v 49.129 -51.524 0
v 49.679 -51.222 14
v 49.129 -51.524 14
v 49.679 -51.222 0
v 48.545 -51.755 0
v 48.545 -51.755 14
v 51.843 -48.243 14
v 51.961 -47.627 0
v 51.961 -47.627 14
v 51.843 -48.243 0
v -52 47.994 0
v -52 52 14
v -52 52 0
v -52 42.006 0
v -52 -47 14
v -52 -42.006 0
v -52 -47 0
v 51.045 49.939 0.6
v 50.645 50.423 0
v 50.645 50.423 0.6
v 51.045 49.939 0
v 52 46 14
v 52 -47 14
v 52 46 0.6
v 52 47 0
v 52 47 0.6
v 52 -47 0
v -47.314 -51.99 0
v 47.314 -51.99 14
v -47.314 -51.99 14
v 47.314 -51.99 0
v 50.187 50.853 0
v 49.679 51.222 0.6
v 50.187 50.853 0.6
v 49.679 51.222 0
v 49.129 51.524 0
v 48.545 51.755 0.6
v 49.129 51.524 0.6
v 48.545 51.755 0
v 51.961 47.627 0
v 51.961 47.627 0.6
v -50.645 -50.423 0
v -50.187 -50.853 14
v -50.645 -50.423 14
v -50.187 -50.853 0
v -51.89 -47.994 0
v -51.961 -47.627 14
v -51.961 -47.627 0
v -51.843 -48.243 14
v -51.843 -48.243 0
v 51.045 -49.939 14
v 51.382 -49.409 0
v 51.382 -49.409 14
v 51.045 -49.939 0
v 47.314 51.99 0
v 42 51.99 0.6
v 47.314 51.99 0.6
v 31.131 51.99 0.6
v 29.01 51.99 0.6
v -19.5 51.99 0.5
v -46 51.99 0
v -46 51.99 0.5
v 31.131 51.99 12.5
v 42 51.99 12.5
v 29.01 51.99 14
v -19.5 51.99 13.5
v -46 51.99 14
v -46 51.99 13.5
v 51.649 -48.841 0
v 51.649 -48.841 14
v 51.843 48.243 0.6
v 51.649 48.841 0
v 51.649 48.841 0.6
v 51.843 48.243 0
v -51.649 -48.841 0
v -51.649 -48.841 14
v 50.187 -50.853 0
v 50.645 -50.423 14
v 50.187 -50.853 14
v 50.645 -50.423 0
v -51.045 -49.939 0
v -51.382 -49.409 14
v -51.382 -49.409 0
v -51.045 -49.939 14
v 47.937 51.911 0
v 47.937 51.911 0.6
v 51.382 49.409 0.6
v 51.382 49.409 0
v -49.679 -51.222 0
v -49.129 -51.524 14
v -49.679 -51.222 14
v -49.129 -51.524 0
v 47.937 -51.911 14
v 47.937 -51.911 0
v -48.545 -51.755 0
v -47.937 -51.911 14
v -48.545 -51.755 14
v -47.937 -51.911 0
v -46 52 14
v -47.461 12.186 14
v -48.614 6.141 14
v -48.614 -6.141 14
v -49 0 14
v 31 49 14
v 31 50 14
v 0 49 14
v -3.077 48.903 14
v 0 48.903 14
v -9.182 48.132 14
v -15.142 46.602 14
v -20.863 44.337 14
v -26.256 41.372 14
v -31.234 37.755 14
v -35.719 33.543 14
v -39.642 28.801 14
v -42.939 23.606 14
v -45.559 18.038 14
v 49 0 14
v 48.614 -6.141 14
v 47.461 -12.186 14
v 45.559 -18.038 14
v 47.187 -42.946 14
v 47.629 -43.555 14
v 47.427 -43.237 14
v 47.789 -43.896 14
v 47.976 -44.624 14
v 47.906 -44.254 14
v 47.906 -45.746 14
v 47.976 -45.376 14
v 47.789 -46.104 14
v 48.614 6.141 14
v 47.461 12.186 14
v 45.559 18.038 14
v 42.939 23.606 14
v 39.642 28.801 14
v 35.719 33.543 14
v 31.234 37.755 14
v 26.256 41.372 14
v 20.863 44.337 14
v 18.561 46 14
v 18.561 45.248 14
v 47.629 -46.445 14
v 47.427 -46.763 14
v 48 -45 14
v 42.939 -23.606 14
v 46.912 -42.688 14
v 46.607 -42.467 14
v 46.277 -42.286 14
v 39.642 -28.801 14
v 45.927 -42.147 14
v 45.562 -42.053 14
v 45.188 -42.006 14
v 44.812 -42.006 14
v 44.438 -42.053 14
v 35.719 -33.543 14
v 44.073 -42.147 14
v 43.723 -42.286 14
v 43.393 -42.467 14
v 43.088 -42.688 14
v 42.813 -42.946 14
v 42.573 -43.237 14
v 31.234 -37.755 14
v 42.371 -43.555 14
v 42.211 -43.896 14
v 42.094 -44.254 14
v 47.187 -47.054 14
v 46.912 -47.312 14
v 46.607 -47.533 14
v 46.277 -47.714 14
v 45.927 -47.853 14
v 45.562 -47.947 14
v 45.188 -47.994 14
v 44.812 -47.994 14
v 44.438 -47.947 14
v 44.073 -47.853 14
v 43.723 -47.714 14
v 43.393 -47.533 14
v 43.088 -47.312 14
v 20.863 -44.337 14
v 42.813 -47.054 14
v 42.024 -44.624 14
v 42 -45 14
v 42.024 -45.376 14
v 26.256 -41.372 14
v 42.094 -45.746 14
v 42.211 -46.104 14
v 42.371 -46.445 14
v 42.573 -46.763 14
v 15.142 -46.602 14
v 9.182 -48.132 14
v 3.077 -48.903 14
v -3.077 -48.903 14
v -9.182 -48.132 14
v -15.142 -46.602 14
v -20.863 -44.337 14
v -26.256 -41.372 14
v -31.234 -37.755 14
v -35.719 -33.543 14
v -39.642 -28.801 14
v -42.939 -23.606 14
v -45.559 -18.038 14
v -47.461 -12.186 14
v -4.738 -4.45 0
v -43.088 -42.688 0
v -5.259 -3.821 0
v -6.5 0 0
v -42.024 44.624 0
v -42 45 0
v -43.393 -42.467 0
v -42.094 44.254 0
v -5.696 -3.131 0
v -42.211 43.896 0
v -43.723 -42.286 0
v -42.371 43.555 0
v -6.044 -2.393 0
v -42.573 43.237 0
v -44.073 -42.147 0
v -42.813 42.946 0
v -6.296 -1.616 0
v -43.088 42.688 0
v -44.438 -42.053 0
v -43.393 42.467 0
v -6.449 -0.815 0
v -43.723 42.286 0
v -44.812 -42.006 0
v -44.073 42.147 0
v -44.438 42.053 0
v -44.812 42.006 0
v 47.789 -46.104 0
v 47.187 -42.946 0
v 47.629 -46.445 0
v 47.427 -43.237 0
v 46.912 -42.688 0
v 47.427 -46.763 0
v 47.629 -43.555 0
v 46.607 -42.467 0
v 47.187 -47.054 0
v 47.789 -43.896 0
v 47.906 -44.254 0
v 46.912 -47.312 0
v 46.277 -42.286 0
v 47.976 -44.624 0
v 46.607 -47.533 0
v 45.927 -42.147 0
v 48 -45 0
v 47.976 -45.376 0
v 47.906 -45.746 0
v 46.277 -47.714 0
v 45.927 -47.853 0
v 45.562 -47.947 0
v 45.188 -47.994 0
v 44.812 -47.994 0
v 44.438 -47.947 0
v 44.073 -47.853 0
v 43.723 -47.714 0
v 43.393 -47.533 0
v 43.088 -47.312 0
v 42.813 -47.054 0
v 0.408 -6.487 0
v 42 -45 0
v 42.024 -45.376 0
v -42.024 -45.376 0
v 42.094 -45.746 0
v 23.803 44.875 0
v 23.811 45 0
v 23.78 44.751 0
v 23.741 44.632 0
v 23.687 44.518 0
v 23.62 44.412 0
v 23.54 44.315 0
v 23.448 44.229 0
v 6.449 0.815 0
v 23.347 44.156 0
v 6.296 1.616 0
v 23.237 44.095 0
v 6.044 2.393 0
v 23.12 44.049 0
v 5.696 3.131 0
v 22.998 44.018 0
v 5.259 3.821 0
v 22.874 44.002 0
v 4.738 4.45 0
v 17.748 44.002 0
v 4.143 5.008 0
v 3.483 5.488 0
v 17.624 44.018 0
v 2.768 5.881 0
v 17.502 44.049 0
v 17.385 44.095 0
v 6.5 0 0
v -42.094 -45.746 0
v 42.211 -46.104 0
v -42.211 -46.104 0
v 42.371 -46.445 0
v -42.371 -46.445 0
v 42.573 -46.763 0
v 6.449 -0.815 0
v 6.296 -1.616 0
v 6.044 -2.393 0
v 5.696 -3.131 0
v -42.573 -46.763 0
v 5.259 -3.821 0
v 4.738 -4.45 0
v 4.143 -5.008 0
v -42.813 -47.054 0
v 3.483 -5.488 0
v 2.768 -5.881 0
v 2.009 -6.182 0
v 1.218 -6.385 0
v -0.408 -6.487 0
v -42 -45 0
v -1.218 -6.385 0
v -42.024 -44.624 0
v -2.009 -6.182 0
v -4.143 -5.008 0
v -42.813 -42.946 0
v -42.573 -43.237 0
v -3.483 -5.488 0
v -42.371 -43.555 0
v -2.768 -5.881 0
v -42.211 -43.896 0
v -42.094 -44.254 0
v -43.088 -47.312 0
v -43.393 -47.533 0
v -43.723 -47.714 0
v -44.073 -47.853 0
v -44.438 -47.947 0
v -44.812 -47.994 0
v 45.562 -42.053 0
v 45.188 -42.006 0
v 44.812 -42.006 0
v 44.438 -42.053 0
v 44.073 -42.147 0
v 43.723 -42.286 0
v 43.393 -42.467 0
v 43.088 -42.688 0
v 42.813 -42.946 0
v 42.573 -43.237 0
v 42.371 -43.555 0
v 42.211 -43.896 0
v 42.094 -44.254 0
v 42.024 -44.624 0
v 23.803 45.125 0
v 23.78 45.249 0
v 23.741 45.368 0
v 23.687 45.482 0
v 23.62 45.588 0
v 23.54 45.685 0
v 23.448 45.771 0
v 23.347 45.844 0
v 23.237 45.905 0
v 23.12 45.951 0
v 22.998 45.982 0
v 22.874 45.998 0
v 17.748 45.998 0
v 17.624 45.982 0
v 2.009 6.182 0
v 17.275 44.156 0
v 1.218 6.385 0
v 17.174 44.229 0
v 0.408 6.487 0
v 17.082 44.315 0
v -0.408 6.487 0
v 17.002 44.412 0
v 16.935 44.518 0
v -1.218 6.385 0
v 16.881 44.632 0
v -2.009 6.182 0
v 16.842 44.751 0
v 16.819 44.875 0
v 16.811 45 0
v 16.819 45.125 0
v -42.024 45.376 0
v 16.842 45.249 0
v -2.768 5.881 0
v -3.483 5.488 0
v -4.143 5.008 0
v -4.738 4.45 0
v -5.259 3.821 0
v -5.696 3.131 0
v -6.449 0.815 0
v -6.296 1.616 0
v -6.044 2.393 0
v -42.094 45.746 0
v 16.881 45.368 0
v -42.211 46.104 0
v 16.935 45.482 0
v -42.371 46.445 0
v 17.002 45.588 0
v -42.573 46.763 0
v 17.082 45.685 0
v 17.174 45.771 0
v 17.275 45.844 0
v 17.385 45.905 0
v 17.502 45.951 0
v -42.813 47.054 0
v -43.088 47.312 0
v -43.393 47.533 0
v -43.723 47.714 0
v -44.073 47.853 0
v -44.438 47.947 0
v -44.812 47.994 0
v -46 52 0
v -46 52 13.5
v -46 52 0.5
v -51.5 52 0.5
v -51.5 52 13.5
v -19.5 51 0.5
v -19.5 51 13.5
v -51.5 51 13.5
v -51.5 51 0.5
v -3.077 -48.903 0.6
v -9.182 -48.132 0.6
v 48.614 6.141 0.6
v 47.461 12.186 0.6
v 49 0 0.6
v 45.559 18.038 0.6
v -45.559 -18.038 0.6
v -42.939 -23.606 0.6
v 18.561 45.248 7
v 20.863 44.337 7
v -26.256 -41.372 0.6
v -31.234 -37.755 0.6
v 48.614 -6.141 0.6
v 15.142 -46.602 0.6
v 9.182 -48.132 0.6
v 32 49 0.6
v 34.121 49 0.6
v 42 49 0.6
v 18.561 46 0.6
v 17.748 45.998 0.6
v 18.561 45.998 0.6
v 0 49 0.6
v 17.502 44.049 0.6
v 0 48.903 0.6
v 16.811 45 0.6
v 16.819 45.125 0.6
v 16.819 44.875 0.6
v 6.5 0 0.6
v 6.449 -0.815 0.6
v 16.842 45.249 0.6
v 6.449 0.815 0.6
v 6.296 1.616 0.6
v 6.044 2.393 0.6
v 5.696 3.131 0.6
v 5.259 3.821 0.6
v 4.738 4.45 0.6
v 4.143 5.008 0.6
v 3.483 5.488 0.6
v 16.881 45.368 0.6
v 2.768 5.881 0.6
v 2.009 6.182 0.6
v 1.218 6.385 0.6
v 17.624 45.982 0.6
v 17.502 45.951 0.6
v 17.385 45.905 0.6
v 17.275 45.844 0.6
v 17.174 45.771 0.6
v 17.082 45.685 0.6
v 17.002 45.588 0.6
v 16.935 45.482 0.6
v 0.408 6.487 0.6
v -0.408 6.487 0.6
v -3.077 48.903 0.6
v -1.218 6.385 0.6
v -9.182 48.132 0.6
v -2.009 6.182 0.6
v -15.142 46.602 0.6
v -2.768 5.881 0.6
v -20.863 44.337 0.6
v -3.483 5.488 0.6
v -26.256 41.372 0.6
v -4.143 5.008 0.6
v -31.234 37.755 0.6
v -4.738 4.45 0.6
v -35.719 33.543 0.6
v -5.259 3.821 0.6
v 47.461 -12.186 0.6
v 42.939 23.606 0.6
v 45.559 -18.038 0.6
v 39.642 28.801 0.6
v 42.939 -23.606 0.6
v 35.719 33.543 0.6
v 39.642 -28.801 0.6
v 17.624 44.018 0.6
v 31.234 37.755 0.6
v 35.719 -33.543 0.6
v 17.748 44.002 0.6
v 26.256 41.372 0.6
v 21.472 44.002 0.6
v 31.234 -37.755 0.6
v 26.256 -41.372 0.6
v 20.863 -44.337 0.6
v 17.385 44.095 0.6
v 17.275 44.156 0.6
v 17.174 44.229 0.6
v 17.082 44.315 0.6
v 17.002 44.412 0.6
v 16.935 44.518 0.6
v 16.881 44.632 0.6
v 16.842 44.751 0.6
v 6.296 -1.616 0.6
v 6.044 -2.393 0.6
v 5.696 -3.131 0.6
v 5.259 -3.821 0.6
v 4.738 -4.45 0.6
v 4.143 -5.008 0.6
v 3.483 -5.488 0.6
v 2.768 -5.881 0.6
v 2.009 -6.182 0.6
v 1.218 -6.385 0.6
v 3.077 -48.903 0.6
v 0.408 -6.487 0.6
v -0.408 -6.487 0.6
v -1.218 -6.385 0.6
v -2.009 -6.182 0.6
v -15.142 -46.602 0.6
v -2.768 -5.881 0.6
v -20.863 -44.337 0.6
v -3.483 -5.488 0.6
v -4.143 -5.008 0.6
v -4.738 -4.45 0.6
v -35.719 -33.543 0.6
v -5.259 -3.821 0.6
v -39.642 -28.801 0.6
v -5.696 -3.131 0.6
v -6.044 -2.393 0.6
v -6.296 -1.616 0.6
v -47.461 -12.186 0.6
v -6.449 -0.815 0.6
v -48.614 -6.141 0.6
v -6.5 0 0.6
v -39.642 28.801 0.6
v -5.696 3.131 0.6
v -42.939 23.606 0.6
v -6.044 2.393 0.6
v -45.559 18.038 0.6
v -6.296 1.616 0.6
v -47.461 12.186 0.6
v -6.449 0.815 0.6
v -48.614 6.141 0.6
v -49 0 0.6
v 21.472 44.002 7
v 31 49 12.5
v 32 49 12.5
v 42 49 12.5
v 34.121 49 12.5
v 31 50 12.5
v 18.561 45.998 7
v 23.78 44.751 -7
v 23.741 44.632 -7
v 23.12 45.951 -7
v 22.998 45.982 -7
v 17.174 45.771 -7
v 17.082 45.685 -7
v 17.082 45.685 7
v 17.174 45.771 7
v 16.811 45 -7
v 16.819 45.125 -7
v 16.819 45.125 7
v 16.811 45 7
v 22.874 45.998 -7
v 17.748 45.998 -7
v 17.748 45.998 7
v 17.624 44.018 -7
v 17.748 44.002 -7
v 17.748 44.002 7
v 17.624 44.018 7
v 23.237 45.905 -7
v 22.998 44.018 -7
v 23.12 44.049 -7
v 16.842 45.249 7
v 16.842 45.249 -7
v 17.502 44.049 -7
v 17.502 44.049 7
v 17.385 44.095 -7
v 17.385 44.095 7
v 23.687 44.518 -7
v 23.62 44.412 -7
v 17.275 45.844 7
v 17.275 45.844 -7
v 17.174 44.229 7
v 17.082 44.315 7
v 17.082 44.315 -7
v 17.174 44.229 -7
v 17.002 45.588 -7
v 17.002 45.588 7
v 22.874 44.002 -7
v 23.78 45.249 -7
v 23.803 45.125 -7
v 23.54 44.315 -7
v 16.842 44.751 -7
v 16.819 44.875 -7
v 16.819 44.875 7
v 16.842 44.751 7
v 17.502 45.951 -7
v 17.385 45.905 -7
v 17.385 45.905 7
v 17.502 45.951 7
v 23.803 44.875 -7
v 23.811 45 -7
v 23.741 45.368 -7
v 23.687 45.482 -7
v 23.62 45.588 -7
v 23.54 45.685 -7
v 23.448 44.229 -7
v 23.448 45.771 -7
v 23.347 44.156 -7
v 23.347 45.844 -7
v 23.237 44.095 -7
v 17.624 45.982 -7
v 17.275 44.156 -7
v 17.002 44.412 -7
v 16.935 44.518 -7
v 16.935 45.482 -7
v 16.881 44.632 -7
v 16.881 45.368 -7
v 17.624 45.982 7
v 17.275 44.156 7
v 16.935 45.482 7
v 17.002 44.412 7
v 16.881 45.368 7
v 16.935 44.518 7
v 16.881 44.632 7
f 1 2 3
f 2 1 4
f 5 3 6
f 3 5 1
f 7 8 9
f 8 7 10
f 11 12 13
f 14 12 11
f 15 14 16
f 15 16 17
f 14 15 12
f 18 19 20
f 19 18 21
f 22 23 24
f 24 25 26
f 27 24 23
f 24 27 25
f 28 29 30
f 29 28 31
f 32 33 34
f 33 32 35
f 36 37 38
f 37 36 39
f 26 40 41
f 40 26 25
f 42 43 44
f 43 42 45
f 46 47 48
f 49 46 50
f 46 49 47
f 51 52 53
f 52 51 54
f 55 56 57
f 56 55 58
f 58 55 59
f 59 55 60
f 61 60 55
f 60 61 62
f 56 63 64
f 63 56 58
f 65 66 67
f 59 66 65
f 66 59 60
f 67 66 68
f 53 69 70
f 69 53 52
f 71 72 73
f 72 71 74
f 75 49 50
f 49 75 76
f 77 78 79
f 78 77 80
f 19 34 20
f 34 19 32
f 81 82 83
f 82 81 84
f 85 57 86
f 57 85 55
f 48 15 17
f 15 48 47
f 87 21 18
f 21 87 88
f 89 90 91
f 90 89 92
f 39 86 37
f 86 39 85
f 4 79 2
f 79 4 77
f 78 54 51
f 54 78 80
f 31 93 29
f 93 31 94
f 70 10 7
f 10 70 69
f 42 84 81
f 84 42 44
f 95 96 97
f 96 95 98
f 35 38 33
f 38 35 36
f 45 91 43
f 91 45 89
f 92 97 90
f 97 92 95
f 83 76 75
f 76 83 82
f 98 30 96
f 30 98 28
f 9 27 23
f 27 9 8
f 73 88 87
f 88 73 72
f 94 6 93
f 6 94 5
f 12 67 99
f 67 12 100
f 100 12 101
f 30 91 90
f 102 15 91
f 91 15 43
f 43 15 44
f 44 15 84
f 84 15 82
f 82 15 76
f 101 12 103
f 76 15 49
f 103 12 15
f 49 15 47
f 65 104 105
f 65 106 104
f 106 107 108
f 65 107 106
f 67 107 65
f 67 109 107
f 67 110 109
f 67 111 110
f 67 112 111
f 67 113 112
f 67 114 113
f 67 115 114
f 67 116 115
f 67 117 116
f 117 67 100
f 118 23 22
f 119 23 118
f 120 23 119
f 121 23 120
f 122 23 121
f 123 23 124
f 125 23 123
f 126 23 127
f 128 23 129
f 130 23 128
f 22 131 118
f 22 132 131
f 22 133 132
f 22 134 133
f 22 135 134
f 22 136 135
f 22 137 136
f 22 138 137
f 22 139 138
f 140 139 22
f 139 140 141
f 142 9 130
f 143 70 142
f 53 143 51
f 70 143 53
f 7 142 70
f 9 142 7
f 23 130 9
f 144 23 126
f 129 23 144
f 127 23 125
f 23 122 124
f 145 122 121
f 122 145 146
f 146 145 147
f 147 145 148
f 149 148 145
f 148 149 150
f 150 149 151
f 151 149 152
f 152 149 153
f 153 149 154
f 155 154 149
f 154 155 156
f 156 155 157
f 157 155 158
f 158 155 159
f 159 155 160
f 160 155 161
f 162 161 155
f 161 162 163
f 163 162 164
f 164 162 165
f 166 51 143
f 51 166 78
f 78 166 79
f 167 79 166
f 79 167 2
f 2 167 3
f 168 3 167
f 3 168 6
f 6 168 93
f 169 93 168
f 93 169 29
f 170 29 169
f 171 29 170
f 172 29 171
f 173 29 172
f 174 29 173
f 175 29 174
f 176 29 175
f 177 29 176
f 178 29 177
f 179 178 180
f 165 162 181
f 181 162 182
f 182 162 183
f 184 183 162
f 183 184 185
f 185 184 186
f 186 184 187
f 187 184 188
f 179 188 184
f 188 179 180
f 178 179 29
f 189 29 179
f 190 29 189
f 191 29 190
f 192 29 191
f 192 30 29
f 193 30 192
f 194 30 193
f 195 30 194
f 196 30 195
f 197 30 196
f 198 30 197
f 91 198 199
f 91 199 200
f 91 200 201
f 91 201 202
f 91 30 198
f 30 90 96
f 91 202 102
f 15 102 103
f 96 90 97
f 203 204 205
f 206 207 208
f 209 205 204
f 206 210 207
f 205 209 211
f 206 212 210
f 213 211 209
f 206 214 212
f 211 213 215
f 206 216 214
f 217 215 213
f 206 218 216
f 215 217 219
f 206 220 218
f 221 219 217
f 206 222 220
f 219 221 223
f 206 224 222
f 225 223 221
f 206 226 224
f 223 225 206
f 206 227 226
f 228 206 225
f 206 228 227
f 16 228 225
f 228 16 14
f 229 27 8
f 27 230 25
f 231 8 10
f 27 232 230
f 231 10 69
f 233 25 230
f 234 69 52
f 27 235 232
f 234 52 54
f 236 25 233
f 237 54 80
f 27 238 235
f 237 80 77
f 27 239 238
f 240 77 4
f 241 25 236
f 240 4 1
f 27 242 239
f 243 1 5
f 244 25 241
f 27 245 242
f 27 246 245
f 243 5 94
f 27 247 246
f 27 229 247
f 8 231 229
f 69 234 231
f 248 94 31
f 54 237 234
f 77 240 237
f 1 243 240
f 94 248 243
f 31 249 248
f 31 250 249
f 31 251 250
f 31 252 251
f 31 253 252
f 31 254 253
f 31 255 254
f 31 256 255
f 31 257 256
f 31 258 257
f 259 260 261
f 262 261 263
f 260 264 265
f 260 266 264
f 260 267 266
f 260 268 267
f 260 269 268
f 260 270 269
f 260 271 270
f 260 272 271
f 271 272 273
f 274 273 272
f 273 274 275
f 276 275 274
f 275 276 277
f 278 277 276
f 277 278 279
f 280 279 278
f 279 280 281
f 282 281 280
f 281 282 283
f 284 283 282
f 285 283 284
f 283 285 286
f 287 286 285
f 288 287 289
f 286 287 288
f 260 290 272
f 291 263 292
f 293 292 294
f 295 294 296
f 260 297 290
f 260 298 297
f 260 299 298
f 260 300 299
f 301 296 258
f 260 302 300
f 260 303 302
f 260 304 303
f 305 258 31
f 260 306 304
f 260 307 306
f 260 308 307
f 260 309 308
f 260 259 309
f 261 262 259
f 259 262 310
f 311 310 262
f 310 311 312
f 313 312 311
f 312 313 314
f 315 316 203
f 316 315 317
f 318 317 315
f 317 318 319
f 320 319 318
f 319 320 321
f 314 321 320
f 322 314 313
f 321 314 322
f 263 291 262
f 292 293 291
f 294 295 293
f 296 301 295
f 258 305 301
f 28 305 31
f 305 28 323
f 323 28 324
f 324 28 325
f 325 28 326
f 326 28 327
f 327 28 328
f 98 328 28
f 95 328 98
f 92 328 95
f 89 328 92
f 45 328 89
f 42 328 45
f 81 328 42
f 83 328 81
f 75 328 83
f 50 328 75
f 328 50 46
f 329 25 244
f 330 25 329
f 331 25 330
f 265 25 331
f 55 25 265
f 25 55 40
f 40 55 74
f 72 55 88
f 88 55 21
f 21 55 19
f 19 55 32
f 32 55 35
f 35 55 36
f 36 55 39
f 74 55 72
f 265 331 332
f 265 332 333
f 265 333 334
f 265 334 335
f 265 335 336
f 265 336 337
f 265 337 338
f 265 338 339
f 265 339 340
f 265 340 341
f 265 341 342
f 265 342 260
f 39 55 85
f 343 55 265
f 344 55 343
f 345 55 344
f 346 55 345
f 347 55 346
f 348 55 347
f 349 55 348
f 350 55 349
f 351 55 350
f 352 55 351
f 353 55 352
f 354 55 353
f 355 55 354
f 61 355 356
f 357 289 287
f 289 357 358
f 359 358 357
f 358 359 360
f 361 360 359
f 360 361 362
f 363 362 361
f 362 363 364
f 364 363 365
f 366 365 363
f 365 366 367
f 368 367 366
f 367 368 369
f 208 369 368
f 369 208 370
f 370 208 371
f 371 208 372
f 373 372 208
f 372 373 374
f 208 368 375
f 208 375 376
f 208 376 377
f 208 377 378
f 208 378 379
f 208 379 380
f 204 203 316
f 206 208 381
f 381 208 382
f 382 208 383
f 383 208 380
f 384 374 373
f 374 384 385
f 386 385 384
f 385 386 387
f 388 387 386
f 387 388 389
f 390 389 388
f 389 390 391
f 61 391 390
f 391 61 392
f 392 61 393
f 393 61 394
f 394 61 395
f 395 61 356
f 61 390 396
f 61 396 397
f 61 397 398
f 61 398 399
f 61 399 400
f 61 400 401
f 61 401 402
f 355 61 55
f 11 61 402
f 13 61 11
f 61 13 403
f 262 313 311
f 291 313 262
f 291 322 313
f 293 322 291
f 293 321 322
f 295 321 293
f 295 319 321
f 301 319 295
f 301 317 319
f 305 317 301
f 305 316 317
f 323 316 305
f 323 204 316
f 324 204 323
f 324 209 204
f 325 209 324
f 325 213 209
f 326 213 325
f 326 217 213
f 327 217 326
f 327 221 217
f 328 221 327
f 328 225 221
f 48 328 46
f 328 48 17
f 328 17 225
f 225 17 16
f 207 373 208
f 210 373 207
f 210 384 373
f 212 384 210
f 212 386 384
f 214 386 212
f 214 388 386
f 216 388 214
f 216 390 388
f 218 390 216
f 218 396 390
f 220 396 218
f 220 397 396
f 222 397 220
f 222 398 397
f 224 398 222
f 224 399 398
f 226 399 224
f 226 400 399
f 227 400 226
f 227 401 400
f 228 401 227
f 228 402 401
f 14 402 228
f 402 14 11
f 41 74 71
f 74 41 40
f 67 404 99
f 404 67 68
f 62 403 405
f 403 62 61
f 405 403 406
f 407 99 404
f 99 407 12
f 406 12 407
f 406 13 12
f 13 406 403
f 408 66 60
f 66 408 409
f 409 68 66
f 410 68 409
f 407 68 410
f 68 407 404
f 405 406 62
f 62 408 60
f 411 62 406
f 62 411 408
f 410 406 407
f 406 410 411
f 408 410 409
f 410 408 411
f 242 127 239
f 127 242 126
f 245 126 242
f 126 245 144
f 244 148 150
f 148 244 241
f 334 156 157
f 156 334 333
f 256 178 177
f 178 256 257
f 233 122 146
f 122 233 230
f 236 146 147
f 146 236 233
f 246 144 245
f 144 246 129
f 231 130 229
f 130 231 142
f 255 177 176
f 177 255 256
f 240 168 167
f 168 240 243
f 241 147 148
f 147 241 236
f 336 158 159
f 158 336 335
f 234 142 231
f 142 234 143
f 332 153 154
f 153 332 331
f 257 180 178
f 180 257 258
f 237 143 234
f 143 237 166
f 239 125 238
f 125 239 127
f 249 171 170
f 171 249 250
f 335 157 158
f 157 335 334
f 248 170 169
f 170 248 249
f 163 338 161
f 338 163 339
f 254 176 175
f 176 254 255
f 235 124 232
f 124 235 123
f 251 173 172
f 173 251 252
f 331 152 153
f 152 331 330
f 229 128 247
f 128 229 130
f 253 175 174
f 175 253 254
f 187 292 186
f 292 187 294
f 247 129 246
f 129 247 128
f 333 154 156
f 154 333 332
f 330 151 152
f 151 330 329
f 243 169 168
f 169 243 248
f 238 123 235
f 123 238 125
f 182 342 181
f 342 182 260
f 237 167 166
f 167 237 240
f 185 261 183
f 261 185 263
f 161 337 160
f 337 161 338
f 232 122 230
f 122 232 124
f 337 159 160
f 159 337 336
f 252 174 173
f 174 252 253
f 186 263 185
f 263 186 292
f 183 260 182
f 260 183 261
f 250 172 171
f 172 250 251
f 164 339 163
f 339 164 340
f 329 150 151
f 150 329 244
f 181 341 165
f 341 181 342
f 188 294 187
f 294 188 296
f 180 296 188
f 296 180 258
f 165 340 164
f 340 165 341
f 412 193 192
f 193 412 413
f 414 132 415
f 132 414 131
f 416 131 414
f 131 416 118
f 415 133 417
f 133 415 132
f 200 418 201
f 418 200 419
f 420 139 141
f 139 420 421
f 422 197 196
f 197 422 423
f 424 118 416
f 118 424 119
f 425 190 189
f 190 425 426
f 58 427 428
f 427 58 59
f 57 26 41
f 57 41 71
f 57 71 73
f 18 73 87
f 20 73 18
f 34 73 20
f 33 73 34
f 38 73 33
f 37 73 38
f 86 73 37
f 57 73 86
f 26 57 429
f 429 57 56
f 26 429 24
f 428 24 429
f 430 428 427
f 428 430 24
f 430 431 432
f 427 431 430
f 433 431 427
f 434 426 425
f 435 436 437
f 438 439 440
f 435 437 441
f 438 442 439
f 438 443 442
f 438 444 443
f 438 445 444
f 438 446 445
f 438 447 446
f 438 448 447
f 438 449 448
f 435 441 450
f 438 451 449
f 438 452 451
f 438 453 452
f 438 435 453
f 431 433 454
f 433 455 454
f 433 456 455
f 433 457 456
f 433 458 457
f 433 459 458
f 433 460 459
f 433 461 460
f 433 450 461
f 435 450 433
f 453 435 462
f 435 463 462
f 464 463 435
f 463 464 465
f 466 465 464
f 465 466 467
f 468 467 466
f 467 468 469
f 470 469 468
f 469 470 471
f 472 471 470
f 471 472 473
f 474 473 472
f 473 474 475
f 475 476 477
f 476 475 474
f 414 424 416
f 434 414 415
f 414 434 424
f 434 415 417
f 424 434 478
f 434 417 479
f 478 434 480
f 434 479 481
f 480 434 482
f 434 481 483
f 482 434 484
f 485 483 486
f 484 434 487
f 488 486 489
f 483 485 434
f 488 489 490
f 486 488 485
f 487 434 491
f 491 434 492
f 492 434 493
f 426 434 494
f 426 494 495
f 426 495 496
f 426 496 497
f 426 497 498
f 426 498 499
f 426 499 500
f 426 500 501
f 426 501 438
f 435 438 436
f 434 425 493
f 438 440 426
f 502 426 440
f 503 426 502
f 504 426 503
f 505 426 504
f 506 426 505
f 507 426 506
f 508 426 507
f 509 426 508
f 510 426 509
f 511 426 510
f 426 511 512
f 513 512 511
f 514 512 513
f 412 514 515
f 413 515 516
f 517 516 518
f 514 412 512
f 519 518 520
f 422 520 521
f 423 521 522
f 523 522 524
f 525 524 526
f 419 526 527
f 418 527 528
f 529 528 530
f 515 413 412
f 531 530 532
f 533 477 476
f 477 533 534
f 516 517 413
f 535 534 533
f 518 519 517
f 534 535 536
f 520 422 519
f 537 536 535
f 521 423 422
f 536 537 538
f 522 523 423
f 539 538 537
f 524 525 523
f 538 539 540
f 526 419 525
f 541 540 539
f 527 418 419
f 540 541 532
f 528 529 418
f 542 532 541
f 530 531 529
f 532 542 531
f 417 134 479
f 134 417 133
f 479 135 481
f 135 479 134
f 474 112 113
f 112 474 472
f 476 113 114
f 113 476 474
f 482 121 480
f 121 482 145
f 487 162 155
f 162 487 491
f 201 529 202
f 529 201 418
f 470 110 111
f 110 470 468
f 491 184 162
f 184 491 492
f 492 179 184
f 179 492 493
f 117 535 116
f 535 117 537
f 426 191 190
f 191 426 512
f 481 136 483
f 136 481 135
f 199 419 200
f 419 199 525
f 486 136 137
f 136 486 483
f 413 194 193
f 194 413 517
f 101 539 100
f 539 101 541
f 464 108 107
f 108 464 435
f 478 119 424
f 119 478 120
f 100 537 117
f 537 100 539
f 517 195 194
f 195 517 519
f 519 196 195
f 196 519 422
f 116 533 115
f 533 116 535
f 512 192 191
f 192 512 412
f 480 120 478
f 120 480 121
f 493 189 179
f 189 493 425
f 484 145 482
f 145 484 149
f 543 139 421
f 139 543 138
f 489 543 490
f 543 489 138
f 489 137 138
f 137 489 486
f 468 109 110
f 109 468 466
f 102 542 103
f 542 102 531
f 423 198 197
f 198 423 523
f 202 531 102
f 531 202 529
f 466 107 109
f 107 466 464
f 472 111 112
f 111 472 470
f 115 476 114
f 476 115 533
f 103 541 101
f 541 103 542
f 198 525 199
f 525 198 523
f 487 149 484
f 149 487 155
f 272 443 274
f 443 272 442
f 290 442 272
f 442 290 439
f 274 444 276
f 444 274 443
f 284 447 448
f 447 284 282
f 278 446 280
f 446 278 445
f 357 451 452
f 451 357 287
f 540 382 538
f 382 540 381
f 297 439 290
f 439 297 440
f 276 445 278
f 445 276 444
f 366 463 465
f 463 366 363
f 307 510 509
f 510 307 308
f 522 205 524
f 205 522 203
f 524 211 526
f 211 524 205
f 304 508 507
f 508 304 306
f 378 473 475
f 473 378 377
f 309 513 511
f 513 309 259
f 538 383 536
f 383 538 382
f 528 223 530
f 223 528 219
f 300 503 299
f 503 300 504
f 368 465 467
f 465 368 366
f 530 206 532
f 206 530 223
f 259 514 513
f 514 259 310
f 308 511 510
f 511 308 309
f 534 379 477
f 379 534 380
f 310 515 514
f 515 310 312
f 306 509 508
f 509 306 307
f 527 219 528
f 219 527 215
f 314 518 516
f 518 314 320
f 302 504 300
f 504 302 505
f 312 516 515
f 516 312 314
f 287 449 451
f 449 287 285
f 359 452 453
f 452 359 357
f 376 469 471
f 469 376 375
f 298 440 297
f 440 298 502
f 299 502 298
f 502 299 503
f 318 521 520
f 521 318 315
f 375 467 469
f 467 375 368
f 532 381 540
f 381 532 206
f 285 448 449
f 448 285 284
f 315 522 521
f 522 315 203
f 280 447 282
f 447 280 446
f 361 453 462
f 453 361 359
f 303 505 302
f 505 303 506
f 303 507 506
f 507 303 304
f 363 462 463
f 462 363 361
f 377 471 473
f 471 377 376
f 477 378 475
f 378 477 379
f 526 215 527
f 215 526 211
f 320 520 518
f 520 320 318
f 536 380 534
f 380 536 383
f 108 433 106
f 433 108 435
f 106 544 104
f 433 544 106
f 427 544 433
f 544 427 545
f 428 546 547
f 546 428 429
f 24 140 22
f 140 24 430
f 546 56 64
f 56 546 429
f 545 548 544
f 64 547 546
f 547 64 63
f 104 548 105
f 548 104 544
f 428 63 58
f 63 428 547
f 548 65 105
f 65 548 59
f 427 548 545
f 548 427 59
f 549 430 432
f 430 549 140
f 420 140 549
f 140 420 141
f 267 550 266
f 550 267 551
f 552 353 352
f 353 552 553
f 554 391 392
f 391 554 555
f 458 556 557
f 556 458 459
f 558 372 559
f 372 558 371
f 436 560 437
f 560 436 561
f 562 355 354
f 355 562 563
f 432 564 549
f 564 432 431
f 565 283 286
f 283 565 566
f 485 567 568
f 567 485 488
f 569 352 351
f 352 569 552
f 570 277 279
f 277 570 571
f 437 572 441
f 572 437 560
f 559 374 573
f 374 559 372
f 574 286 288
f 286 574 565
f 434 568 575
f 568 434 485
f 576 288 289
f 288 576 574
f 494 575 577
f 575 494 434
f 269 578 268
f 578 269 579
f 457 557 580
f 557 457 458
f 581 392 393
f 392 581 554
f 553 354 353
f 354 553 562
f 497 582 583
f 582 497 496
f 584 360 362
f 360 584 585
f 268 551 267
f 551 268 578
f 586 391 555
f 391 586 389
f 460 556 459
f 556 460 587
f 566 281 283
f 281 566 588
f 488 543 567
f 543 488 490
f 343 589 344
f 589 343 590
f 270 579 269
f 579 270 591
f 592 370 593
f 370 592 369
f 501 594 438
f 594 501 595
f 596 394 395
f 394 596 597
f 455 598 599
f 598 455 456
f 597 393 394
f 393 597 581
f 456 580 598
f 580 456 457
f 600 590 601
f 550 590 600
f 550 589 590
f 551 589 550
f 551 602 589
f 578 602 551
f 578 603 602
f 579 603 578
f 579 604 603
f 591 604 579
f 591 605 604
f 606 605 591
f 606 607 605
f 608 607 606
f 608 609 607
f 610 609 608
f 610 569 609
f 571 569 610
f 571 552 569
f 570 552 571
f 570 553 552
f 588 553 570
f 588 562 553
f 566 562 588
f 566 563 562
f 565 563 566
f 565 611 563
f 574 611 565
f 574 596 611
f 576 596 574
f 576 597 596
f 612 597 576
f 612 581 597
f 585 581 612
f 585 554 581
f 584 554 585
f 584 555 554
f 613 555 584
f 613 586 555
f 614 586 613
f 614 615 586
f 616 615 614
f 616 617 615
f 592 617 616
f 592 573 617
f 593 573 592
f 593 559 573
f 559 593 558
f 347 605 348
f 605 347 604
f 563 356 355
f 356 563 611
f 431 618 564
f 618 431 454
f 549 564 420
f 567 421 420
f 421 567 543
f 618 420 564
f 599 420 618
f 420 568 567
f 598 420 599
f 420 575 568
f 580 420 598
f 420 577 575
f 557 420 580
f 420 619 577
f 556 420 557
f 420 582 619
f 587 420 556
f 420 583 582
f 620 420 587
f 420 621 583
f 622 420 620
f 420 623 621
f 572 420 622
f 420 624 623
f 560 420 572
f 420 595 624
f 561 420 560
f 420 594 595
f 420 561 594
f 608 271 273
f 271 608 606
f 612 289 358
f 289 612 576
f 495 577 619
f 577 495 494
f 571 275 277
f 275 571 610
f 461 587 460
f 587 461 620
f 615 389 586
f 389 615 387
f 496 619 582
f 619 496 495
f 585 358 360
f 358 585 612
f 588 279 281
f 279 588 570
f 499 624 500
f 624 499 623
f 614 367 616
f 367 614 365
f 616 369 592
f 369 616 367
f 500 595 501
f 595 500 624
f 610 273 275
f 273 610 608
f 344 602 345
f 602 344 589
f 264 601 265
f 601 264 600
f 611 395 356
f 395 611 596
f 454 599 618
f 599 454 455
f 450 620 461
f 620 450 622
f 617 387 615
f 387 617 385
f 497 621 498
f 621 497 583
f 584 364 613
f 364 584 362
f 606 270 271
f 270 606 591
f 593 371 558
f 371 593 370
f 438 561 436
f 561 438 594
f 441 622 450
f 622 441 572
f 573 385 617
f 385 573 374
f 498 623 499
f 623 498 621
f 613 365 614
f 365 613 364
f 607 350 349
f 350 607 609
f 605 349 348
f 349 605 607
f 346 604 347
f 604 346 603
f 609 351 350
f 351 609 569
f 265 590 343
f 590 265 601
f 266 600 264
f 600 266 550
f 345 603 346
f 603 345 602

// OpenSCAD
$fn = 50;


union() {
	difference() {
		union() {
			hull() {
				translate(v = [-47.0000000000, 47.0000000000, 0]) {
					cylinder(h = 14, r = 5);
				}
				translate(v = [47.0000000000, 47.0000000000, 0]) {
					cylinder(h = 14, r = 5);
				}
				translate(v = [-47.0000000000, -47.0000000000, 0]) {
					cylinder(h = 14, r = 5);
				}
				translate(v = [47.0000000000, -47.0000000000, 0]) {
					cylinder(h = 14, r = 5);
				}
			}
			translate(v = [-52.0000000000, 46.0000000000, 0]) {
				cube(size = [6, 6, 14]);
			}
		}
		union() {
			translate(v = [-52.5000000000, -45.0000000000, -250.0000000000]) {
				rotate(a = [0, 0, 0]) {
					difference() {
						union() {
							hull() {
								translate(v = [7.5000000000, 0, 0]) {
									cylinder(h = 250, r = 3.0000000000, r1 = 3.0000000000, r2 = 3.0000000000);
								}
								translate(v = [-7.5000000000, 0, 0]) {
									cylinder(h = 250, r = 3.0000000000, r1 = 3.0000000000, r2 = 3.0000000000);
								}
							}
						}
						union();
					}
				}
			}
			translate(v = [-52.5000000000, 45.0000000000, -250.0000000000]) {
				rotate(a = [0, 0, 0]) {
					difference() {
						union() {
							hull() {
								translate(v = [7.5000000000, 0, 0]) {
									cylinder(h = 250, r = 3.0000000000, r1 = 3.0000000000, r2 = 3.0000000000);
								}
								translate(v = [-7.5000000000, 0, 0]) {
									cylinder(h = 250, r = 3.0000000000, r1 = 3.0000000000, r2 = 3.0000000000);
								}
							}
						}
						union();
					}
				}
			}
			translate(v = [-51.5000000000, 51.0000000000, 0.5000000000]) {
				cube(size = [32, 1, 13.0000000000]);
			}
			translate(v = [45.0000000000, -45.0000000000, 0]) {
				cylinder(h = 100, r = 3.0000000000);
			}
			translate(v = [0, 0, 0.6000000000]) {
				cylinder(h = 16.4000000000, r = 49.0000000000);
			}
			translate(v = [0, 0, -7.0000000000]) {
				cylinder(h = 14, r = 6.5000000000);
			}
			translate(v = [0.0000000000, 46.0000000000, 0.6000000000]) {
				cube(size = [52.0000000000, 3, 16.4000000000]);
			}
			translate(v = [42.0000000000, 46.0000000000, 0.6000000000]) {
				cube(size = [10, 6, 16.4000000000]);
			}
			translate(v = [31.0000000000, 46.0000000000, 12.5000000000]) {
				cube(size = [21, 6, 1.5000000000]);
			}
			translate(v = [28.2500000000, 52.7500000000, 0.6000000000]) {
				rotate(a = [0, 0, -45]) {
					cube(size = [7.5000000000, 1.5000000000, 16.4000000000]);
				}
			}
			translate(v = [11.0610000000, 44.0000000000, 0.6000000000]) {
				cube(size = [7.5000000000, 2, 13.4000000000]);
			}
		}
	}
	union() {
		translate(v = [20.3110000000, 45.0000000000, -7.0000000000]) {
			rotate(a = [0, 0, 0]) {
				difference() {
					union() {
						#hull() {
							#translate(v = [2.5000000000, 0, 0]) {
								cylinder(h = 14, r = 1.0000000000, r1 = 1.0000000000, r2 = 1.0000000000);
							}
							#translate(v = [-2.5000000000, 0, 0]) {
								cylinder(h = 14, r = 1.0000000000, r1 = 1.0000000000, r2 = 1.0000000000);
							}
						}
					}
					union();
				}
			}
		}
	}
}
